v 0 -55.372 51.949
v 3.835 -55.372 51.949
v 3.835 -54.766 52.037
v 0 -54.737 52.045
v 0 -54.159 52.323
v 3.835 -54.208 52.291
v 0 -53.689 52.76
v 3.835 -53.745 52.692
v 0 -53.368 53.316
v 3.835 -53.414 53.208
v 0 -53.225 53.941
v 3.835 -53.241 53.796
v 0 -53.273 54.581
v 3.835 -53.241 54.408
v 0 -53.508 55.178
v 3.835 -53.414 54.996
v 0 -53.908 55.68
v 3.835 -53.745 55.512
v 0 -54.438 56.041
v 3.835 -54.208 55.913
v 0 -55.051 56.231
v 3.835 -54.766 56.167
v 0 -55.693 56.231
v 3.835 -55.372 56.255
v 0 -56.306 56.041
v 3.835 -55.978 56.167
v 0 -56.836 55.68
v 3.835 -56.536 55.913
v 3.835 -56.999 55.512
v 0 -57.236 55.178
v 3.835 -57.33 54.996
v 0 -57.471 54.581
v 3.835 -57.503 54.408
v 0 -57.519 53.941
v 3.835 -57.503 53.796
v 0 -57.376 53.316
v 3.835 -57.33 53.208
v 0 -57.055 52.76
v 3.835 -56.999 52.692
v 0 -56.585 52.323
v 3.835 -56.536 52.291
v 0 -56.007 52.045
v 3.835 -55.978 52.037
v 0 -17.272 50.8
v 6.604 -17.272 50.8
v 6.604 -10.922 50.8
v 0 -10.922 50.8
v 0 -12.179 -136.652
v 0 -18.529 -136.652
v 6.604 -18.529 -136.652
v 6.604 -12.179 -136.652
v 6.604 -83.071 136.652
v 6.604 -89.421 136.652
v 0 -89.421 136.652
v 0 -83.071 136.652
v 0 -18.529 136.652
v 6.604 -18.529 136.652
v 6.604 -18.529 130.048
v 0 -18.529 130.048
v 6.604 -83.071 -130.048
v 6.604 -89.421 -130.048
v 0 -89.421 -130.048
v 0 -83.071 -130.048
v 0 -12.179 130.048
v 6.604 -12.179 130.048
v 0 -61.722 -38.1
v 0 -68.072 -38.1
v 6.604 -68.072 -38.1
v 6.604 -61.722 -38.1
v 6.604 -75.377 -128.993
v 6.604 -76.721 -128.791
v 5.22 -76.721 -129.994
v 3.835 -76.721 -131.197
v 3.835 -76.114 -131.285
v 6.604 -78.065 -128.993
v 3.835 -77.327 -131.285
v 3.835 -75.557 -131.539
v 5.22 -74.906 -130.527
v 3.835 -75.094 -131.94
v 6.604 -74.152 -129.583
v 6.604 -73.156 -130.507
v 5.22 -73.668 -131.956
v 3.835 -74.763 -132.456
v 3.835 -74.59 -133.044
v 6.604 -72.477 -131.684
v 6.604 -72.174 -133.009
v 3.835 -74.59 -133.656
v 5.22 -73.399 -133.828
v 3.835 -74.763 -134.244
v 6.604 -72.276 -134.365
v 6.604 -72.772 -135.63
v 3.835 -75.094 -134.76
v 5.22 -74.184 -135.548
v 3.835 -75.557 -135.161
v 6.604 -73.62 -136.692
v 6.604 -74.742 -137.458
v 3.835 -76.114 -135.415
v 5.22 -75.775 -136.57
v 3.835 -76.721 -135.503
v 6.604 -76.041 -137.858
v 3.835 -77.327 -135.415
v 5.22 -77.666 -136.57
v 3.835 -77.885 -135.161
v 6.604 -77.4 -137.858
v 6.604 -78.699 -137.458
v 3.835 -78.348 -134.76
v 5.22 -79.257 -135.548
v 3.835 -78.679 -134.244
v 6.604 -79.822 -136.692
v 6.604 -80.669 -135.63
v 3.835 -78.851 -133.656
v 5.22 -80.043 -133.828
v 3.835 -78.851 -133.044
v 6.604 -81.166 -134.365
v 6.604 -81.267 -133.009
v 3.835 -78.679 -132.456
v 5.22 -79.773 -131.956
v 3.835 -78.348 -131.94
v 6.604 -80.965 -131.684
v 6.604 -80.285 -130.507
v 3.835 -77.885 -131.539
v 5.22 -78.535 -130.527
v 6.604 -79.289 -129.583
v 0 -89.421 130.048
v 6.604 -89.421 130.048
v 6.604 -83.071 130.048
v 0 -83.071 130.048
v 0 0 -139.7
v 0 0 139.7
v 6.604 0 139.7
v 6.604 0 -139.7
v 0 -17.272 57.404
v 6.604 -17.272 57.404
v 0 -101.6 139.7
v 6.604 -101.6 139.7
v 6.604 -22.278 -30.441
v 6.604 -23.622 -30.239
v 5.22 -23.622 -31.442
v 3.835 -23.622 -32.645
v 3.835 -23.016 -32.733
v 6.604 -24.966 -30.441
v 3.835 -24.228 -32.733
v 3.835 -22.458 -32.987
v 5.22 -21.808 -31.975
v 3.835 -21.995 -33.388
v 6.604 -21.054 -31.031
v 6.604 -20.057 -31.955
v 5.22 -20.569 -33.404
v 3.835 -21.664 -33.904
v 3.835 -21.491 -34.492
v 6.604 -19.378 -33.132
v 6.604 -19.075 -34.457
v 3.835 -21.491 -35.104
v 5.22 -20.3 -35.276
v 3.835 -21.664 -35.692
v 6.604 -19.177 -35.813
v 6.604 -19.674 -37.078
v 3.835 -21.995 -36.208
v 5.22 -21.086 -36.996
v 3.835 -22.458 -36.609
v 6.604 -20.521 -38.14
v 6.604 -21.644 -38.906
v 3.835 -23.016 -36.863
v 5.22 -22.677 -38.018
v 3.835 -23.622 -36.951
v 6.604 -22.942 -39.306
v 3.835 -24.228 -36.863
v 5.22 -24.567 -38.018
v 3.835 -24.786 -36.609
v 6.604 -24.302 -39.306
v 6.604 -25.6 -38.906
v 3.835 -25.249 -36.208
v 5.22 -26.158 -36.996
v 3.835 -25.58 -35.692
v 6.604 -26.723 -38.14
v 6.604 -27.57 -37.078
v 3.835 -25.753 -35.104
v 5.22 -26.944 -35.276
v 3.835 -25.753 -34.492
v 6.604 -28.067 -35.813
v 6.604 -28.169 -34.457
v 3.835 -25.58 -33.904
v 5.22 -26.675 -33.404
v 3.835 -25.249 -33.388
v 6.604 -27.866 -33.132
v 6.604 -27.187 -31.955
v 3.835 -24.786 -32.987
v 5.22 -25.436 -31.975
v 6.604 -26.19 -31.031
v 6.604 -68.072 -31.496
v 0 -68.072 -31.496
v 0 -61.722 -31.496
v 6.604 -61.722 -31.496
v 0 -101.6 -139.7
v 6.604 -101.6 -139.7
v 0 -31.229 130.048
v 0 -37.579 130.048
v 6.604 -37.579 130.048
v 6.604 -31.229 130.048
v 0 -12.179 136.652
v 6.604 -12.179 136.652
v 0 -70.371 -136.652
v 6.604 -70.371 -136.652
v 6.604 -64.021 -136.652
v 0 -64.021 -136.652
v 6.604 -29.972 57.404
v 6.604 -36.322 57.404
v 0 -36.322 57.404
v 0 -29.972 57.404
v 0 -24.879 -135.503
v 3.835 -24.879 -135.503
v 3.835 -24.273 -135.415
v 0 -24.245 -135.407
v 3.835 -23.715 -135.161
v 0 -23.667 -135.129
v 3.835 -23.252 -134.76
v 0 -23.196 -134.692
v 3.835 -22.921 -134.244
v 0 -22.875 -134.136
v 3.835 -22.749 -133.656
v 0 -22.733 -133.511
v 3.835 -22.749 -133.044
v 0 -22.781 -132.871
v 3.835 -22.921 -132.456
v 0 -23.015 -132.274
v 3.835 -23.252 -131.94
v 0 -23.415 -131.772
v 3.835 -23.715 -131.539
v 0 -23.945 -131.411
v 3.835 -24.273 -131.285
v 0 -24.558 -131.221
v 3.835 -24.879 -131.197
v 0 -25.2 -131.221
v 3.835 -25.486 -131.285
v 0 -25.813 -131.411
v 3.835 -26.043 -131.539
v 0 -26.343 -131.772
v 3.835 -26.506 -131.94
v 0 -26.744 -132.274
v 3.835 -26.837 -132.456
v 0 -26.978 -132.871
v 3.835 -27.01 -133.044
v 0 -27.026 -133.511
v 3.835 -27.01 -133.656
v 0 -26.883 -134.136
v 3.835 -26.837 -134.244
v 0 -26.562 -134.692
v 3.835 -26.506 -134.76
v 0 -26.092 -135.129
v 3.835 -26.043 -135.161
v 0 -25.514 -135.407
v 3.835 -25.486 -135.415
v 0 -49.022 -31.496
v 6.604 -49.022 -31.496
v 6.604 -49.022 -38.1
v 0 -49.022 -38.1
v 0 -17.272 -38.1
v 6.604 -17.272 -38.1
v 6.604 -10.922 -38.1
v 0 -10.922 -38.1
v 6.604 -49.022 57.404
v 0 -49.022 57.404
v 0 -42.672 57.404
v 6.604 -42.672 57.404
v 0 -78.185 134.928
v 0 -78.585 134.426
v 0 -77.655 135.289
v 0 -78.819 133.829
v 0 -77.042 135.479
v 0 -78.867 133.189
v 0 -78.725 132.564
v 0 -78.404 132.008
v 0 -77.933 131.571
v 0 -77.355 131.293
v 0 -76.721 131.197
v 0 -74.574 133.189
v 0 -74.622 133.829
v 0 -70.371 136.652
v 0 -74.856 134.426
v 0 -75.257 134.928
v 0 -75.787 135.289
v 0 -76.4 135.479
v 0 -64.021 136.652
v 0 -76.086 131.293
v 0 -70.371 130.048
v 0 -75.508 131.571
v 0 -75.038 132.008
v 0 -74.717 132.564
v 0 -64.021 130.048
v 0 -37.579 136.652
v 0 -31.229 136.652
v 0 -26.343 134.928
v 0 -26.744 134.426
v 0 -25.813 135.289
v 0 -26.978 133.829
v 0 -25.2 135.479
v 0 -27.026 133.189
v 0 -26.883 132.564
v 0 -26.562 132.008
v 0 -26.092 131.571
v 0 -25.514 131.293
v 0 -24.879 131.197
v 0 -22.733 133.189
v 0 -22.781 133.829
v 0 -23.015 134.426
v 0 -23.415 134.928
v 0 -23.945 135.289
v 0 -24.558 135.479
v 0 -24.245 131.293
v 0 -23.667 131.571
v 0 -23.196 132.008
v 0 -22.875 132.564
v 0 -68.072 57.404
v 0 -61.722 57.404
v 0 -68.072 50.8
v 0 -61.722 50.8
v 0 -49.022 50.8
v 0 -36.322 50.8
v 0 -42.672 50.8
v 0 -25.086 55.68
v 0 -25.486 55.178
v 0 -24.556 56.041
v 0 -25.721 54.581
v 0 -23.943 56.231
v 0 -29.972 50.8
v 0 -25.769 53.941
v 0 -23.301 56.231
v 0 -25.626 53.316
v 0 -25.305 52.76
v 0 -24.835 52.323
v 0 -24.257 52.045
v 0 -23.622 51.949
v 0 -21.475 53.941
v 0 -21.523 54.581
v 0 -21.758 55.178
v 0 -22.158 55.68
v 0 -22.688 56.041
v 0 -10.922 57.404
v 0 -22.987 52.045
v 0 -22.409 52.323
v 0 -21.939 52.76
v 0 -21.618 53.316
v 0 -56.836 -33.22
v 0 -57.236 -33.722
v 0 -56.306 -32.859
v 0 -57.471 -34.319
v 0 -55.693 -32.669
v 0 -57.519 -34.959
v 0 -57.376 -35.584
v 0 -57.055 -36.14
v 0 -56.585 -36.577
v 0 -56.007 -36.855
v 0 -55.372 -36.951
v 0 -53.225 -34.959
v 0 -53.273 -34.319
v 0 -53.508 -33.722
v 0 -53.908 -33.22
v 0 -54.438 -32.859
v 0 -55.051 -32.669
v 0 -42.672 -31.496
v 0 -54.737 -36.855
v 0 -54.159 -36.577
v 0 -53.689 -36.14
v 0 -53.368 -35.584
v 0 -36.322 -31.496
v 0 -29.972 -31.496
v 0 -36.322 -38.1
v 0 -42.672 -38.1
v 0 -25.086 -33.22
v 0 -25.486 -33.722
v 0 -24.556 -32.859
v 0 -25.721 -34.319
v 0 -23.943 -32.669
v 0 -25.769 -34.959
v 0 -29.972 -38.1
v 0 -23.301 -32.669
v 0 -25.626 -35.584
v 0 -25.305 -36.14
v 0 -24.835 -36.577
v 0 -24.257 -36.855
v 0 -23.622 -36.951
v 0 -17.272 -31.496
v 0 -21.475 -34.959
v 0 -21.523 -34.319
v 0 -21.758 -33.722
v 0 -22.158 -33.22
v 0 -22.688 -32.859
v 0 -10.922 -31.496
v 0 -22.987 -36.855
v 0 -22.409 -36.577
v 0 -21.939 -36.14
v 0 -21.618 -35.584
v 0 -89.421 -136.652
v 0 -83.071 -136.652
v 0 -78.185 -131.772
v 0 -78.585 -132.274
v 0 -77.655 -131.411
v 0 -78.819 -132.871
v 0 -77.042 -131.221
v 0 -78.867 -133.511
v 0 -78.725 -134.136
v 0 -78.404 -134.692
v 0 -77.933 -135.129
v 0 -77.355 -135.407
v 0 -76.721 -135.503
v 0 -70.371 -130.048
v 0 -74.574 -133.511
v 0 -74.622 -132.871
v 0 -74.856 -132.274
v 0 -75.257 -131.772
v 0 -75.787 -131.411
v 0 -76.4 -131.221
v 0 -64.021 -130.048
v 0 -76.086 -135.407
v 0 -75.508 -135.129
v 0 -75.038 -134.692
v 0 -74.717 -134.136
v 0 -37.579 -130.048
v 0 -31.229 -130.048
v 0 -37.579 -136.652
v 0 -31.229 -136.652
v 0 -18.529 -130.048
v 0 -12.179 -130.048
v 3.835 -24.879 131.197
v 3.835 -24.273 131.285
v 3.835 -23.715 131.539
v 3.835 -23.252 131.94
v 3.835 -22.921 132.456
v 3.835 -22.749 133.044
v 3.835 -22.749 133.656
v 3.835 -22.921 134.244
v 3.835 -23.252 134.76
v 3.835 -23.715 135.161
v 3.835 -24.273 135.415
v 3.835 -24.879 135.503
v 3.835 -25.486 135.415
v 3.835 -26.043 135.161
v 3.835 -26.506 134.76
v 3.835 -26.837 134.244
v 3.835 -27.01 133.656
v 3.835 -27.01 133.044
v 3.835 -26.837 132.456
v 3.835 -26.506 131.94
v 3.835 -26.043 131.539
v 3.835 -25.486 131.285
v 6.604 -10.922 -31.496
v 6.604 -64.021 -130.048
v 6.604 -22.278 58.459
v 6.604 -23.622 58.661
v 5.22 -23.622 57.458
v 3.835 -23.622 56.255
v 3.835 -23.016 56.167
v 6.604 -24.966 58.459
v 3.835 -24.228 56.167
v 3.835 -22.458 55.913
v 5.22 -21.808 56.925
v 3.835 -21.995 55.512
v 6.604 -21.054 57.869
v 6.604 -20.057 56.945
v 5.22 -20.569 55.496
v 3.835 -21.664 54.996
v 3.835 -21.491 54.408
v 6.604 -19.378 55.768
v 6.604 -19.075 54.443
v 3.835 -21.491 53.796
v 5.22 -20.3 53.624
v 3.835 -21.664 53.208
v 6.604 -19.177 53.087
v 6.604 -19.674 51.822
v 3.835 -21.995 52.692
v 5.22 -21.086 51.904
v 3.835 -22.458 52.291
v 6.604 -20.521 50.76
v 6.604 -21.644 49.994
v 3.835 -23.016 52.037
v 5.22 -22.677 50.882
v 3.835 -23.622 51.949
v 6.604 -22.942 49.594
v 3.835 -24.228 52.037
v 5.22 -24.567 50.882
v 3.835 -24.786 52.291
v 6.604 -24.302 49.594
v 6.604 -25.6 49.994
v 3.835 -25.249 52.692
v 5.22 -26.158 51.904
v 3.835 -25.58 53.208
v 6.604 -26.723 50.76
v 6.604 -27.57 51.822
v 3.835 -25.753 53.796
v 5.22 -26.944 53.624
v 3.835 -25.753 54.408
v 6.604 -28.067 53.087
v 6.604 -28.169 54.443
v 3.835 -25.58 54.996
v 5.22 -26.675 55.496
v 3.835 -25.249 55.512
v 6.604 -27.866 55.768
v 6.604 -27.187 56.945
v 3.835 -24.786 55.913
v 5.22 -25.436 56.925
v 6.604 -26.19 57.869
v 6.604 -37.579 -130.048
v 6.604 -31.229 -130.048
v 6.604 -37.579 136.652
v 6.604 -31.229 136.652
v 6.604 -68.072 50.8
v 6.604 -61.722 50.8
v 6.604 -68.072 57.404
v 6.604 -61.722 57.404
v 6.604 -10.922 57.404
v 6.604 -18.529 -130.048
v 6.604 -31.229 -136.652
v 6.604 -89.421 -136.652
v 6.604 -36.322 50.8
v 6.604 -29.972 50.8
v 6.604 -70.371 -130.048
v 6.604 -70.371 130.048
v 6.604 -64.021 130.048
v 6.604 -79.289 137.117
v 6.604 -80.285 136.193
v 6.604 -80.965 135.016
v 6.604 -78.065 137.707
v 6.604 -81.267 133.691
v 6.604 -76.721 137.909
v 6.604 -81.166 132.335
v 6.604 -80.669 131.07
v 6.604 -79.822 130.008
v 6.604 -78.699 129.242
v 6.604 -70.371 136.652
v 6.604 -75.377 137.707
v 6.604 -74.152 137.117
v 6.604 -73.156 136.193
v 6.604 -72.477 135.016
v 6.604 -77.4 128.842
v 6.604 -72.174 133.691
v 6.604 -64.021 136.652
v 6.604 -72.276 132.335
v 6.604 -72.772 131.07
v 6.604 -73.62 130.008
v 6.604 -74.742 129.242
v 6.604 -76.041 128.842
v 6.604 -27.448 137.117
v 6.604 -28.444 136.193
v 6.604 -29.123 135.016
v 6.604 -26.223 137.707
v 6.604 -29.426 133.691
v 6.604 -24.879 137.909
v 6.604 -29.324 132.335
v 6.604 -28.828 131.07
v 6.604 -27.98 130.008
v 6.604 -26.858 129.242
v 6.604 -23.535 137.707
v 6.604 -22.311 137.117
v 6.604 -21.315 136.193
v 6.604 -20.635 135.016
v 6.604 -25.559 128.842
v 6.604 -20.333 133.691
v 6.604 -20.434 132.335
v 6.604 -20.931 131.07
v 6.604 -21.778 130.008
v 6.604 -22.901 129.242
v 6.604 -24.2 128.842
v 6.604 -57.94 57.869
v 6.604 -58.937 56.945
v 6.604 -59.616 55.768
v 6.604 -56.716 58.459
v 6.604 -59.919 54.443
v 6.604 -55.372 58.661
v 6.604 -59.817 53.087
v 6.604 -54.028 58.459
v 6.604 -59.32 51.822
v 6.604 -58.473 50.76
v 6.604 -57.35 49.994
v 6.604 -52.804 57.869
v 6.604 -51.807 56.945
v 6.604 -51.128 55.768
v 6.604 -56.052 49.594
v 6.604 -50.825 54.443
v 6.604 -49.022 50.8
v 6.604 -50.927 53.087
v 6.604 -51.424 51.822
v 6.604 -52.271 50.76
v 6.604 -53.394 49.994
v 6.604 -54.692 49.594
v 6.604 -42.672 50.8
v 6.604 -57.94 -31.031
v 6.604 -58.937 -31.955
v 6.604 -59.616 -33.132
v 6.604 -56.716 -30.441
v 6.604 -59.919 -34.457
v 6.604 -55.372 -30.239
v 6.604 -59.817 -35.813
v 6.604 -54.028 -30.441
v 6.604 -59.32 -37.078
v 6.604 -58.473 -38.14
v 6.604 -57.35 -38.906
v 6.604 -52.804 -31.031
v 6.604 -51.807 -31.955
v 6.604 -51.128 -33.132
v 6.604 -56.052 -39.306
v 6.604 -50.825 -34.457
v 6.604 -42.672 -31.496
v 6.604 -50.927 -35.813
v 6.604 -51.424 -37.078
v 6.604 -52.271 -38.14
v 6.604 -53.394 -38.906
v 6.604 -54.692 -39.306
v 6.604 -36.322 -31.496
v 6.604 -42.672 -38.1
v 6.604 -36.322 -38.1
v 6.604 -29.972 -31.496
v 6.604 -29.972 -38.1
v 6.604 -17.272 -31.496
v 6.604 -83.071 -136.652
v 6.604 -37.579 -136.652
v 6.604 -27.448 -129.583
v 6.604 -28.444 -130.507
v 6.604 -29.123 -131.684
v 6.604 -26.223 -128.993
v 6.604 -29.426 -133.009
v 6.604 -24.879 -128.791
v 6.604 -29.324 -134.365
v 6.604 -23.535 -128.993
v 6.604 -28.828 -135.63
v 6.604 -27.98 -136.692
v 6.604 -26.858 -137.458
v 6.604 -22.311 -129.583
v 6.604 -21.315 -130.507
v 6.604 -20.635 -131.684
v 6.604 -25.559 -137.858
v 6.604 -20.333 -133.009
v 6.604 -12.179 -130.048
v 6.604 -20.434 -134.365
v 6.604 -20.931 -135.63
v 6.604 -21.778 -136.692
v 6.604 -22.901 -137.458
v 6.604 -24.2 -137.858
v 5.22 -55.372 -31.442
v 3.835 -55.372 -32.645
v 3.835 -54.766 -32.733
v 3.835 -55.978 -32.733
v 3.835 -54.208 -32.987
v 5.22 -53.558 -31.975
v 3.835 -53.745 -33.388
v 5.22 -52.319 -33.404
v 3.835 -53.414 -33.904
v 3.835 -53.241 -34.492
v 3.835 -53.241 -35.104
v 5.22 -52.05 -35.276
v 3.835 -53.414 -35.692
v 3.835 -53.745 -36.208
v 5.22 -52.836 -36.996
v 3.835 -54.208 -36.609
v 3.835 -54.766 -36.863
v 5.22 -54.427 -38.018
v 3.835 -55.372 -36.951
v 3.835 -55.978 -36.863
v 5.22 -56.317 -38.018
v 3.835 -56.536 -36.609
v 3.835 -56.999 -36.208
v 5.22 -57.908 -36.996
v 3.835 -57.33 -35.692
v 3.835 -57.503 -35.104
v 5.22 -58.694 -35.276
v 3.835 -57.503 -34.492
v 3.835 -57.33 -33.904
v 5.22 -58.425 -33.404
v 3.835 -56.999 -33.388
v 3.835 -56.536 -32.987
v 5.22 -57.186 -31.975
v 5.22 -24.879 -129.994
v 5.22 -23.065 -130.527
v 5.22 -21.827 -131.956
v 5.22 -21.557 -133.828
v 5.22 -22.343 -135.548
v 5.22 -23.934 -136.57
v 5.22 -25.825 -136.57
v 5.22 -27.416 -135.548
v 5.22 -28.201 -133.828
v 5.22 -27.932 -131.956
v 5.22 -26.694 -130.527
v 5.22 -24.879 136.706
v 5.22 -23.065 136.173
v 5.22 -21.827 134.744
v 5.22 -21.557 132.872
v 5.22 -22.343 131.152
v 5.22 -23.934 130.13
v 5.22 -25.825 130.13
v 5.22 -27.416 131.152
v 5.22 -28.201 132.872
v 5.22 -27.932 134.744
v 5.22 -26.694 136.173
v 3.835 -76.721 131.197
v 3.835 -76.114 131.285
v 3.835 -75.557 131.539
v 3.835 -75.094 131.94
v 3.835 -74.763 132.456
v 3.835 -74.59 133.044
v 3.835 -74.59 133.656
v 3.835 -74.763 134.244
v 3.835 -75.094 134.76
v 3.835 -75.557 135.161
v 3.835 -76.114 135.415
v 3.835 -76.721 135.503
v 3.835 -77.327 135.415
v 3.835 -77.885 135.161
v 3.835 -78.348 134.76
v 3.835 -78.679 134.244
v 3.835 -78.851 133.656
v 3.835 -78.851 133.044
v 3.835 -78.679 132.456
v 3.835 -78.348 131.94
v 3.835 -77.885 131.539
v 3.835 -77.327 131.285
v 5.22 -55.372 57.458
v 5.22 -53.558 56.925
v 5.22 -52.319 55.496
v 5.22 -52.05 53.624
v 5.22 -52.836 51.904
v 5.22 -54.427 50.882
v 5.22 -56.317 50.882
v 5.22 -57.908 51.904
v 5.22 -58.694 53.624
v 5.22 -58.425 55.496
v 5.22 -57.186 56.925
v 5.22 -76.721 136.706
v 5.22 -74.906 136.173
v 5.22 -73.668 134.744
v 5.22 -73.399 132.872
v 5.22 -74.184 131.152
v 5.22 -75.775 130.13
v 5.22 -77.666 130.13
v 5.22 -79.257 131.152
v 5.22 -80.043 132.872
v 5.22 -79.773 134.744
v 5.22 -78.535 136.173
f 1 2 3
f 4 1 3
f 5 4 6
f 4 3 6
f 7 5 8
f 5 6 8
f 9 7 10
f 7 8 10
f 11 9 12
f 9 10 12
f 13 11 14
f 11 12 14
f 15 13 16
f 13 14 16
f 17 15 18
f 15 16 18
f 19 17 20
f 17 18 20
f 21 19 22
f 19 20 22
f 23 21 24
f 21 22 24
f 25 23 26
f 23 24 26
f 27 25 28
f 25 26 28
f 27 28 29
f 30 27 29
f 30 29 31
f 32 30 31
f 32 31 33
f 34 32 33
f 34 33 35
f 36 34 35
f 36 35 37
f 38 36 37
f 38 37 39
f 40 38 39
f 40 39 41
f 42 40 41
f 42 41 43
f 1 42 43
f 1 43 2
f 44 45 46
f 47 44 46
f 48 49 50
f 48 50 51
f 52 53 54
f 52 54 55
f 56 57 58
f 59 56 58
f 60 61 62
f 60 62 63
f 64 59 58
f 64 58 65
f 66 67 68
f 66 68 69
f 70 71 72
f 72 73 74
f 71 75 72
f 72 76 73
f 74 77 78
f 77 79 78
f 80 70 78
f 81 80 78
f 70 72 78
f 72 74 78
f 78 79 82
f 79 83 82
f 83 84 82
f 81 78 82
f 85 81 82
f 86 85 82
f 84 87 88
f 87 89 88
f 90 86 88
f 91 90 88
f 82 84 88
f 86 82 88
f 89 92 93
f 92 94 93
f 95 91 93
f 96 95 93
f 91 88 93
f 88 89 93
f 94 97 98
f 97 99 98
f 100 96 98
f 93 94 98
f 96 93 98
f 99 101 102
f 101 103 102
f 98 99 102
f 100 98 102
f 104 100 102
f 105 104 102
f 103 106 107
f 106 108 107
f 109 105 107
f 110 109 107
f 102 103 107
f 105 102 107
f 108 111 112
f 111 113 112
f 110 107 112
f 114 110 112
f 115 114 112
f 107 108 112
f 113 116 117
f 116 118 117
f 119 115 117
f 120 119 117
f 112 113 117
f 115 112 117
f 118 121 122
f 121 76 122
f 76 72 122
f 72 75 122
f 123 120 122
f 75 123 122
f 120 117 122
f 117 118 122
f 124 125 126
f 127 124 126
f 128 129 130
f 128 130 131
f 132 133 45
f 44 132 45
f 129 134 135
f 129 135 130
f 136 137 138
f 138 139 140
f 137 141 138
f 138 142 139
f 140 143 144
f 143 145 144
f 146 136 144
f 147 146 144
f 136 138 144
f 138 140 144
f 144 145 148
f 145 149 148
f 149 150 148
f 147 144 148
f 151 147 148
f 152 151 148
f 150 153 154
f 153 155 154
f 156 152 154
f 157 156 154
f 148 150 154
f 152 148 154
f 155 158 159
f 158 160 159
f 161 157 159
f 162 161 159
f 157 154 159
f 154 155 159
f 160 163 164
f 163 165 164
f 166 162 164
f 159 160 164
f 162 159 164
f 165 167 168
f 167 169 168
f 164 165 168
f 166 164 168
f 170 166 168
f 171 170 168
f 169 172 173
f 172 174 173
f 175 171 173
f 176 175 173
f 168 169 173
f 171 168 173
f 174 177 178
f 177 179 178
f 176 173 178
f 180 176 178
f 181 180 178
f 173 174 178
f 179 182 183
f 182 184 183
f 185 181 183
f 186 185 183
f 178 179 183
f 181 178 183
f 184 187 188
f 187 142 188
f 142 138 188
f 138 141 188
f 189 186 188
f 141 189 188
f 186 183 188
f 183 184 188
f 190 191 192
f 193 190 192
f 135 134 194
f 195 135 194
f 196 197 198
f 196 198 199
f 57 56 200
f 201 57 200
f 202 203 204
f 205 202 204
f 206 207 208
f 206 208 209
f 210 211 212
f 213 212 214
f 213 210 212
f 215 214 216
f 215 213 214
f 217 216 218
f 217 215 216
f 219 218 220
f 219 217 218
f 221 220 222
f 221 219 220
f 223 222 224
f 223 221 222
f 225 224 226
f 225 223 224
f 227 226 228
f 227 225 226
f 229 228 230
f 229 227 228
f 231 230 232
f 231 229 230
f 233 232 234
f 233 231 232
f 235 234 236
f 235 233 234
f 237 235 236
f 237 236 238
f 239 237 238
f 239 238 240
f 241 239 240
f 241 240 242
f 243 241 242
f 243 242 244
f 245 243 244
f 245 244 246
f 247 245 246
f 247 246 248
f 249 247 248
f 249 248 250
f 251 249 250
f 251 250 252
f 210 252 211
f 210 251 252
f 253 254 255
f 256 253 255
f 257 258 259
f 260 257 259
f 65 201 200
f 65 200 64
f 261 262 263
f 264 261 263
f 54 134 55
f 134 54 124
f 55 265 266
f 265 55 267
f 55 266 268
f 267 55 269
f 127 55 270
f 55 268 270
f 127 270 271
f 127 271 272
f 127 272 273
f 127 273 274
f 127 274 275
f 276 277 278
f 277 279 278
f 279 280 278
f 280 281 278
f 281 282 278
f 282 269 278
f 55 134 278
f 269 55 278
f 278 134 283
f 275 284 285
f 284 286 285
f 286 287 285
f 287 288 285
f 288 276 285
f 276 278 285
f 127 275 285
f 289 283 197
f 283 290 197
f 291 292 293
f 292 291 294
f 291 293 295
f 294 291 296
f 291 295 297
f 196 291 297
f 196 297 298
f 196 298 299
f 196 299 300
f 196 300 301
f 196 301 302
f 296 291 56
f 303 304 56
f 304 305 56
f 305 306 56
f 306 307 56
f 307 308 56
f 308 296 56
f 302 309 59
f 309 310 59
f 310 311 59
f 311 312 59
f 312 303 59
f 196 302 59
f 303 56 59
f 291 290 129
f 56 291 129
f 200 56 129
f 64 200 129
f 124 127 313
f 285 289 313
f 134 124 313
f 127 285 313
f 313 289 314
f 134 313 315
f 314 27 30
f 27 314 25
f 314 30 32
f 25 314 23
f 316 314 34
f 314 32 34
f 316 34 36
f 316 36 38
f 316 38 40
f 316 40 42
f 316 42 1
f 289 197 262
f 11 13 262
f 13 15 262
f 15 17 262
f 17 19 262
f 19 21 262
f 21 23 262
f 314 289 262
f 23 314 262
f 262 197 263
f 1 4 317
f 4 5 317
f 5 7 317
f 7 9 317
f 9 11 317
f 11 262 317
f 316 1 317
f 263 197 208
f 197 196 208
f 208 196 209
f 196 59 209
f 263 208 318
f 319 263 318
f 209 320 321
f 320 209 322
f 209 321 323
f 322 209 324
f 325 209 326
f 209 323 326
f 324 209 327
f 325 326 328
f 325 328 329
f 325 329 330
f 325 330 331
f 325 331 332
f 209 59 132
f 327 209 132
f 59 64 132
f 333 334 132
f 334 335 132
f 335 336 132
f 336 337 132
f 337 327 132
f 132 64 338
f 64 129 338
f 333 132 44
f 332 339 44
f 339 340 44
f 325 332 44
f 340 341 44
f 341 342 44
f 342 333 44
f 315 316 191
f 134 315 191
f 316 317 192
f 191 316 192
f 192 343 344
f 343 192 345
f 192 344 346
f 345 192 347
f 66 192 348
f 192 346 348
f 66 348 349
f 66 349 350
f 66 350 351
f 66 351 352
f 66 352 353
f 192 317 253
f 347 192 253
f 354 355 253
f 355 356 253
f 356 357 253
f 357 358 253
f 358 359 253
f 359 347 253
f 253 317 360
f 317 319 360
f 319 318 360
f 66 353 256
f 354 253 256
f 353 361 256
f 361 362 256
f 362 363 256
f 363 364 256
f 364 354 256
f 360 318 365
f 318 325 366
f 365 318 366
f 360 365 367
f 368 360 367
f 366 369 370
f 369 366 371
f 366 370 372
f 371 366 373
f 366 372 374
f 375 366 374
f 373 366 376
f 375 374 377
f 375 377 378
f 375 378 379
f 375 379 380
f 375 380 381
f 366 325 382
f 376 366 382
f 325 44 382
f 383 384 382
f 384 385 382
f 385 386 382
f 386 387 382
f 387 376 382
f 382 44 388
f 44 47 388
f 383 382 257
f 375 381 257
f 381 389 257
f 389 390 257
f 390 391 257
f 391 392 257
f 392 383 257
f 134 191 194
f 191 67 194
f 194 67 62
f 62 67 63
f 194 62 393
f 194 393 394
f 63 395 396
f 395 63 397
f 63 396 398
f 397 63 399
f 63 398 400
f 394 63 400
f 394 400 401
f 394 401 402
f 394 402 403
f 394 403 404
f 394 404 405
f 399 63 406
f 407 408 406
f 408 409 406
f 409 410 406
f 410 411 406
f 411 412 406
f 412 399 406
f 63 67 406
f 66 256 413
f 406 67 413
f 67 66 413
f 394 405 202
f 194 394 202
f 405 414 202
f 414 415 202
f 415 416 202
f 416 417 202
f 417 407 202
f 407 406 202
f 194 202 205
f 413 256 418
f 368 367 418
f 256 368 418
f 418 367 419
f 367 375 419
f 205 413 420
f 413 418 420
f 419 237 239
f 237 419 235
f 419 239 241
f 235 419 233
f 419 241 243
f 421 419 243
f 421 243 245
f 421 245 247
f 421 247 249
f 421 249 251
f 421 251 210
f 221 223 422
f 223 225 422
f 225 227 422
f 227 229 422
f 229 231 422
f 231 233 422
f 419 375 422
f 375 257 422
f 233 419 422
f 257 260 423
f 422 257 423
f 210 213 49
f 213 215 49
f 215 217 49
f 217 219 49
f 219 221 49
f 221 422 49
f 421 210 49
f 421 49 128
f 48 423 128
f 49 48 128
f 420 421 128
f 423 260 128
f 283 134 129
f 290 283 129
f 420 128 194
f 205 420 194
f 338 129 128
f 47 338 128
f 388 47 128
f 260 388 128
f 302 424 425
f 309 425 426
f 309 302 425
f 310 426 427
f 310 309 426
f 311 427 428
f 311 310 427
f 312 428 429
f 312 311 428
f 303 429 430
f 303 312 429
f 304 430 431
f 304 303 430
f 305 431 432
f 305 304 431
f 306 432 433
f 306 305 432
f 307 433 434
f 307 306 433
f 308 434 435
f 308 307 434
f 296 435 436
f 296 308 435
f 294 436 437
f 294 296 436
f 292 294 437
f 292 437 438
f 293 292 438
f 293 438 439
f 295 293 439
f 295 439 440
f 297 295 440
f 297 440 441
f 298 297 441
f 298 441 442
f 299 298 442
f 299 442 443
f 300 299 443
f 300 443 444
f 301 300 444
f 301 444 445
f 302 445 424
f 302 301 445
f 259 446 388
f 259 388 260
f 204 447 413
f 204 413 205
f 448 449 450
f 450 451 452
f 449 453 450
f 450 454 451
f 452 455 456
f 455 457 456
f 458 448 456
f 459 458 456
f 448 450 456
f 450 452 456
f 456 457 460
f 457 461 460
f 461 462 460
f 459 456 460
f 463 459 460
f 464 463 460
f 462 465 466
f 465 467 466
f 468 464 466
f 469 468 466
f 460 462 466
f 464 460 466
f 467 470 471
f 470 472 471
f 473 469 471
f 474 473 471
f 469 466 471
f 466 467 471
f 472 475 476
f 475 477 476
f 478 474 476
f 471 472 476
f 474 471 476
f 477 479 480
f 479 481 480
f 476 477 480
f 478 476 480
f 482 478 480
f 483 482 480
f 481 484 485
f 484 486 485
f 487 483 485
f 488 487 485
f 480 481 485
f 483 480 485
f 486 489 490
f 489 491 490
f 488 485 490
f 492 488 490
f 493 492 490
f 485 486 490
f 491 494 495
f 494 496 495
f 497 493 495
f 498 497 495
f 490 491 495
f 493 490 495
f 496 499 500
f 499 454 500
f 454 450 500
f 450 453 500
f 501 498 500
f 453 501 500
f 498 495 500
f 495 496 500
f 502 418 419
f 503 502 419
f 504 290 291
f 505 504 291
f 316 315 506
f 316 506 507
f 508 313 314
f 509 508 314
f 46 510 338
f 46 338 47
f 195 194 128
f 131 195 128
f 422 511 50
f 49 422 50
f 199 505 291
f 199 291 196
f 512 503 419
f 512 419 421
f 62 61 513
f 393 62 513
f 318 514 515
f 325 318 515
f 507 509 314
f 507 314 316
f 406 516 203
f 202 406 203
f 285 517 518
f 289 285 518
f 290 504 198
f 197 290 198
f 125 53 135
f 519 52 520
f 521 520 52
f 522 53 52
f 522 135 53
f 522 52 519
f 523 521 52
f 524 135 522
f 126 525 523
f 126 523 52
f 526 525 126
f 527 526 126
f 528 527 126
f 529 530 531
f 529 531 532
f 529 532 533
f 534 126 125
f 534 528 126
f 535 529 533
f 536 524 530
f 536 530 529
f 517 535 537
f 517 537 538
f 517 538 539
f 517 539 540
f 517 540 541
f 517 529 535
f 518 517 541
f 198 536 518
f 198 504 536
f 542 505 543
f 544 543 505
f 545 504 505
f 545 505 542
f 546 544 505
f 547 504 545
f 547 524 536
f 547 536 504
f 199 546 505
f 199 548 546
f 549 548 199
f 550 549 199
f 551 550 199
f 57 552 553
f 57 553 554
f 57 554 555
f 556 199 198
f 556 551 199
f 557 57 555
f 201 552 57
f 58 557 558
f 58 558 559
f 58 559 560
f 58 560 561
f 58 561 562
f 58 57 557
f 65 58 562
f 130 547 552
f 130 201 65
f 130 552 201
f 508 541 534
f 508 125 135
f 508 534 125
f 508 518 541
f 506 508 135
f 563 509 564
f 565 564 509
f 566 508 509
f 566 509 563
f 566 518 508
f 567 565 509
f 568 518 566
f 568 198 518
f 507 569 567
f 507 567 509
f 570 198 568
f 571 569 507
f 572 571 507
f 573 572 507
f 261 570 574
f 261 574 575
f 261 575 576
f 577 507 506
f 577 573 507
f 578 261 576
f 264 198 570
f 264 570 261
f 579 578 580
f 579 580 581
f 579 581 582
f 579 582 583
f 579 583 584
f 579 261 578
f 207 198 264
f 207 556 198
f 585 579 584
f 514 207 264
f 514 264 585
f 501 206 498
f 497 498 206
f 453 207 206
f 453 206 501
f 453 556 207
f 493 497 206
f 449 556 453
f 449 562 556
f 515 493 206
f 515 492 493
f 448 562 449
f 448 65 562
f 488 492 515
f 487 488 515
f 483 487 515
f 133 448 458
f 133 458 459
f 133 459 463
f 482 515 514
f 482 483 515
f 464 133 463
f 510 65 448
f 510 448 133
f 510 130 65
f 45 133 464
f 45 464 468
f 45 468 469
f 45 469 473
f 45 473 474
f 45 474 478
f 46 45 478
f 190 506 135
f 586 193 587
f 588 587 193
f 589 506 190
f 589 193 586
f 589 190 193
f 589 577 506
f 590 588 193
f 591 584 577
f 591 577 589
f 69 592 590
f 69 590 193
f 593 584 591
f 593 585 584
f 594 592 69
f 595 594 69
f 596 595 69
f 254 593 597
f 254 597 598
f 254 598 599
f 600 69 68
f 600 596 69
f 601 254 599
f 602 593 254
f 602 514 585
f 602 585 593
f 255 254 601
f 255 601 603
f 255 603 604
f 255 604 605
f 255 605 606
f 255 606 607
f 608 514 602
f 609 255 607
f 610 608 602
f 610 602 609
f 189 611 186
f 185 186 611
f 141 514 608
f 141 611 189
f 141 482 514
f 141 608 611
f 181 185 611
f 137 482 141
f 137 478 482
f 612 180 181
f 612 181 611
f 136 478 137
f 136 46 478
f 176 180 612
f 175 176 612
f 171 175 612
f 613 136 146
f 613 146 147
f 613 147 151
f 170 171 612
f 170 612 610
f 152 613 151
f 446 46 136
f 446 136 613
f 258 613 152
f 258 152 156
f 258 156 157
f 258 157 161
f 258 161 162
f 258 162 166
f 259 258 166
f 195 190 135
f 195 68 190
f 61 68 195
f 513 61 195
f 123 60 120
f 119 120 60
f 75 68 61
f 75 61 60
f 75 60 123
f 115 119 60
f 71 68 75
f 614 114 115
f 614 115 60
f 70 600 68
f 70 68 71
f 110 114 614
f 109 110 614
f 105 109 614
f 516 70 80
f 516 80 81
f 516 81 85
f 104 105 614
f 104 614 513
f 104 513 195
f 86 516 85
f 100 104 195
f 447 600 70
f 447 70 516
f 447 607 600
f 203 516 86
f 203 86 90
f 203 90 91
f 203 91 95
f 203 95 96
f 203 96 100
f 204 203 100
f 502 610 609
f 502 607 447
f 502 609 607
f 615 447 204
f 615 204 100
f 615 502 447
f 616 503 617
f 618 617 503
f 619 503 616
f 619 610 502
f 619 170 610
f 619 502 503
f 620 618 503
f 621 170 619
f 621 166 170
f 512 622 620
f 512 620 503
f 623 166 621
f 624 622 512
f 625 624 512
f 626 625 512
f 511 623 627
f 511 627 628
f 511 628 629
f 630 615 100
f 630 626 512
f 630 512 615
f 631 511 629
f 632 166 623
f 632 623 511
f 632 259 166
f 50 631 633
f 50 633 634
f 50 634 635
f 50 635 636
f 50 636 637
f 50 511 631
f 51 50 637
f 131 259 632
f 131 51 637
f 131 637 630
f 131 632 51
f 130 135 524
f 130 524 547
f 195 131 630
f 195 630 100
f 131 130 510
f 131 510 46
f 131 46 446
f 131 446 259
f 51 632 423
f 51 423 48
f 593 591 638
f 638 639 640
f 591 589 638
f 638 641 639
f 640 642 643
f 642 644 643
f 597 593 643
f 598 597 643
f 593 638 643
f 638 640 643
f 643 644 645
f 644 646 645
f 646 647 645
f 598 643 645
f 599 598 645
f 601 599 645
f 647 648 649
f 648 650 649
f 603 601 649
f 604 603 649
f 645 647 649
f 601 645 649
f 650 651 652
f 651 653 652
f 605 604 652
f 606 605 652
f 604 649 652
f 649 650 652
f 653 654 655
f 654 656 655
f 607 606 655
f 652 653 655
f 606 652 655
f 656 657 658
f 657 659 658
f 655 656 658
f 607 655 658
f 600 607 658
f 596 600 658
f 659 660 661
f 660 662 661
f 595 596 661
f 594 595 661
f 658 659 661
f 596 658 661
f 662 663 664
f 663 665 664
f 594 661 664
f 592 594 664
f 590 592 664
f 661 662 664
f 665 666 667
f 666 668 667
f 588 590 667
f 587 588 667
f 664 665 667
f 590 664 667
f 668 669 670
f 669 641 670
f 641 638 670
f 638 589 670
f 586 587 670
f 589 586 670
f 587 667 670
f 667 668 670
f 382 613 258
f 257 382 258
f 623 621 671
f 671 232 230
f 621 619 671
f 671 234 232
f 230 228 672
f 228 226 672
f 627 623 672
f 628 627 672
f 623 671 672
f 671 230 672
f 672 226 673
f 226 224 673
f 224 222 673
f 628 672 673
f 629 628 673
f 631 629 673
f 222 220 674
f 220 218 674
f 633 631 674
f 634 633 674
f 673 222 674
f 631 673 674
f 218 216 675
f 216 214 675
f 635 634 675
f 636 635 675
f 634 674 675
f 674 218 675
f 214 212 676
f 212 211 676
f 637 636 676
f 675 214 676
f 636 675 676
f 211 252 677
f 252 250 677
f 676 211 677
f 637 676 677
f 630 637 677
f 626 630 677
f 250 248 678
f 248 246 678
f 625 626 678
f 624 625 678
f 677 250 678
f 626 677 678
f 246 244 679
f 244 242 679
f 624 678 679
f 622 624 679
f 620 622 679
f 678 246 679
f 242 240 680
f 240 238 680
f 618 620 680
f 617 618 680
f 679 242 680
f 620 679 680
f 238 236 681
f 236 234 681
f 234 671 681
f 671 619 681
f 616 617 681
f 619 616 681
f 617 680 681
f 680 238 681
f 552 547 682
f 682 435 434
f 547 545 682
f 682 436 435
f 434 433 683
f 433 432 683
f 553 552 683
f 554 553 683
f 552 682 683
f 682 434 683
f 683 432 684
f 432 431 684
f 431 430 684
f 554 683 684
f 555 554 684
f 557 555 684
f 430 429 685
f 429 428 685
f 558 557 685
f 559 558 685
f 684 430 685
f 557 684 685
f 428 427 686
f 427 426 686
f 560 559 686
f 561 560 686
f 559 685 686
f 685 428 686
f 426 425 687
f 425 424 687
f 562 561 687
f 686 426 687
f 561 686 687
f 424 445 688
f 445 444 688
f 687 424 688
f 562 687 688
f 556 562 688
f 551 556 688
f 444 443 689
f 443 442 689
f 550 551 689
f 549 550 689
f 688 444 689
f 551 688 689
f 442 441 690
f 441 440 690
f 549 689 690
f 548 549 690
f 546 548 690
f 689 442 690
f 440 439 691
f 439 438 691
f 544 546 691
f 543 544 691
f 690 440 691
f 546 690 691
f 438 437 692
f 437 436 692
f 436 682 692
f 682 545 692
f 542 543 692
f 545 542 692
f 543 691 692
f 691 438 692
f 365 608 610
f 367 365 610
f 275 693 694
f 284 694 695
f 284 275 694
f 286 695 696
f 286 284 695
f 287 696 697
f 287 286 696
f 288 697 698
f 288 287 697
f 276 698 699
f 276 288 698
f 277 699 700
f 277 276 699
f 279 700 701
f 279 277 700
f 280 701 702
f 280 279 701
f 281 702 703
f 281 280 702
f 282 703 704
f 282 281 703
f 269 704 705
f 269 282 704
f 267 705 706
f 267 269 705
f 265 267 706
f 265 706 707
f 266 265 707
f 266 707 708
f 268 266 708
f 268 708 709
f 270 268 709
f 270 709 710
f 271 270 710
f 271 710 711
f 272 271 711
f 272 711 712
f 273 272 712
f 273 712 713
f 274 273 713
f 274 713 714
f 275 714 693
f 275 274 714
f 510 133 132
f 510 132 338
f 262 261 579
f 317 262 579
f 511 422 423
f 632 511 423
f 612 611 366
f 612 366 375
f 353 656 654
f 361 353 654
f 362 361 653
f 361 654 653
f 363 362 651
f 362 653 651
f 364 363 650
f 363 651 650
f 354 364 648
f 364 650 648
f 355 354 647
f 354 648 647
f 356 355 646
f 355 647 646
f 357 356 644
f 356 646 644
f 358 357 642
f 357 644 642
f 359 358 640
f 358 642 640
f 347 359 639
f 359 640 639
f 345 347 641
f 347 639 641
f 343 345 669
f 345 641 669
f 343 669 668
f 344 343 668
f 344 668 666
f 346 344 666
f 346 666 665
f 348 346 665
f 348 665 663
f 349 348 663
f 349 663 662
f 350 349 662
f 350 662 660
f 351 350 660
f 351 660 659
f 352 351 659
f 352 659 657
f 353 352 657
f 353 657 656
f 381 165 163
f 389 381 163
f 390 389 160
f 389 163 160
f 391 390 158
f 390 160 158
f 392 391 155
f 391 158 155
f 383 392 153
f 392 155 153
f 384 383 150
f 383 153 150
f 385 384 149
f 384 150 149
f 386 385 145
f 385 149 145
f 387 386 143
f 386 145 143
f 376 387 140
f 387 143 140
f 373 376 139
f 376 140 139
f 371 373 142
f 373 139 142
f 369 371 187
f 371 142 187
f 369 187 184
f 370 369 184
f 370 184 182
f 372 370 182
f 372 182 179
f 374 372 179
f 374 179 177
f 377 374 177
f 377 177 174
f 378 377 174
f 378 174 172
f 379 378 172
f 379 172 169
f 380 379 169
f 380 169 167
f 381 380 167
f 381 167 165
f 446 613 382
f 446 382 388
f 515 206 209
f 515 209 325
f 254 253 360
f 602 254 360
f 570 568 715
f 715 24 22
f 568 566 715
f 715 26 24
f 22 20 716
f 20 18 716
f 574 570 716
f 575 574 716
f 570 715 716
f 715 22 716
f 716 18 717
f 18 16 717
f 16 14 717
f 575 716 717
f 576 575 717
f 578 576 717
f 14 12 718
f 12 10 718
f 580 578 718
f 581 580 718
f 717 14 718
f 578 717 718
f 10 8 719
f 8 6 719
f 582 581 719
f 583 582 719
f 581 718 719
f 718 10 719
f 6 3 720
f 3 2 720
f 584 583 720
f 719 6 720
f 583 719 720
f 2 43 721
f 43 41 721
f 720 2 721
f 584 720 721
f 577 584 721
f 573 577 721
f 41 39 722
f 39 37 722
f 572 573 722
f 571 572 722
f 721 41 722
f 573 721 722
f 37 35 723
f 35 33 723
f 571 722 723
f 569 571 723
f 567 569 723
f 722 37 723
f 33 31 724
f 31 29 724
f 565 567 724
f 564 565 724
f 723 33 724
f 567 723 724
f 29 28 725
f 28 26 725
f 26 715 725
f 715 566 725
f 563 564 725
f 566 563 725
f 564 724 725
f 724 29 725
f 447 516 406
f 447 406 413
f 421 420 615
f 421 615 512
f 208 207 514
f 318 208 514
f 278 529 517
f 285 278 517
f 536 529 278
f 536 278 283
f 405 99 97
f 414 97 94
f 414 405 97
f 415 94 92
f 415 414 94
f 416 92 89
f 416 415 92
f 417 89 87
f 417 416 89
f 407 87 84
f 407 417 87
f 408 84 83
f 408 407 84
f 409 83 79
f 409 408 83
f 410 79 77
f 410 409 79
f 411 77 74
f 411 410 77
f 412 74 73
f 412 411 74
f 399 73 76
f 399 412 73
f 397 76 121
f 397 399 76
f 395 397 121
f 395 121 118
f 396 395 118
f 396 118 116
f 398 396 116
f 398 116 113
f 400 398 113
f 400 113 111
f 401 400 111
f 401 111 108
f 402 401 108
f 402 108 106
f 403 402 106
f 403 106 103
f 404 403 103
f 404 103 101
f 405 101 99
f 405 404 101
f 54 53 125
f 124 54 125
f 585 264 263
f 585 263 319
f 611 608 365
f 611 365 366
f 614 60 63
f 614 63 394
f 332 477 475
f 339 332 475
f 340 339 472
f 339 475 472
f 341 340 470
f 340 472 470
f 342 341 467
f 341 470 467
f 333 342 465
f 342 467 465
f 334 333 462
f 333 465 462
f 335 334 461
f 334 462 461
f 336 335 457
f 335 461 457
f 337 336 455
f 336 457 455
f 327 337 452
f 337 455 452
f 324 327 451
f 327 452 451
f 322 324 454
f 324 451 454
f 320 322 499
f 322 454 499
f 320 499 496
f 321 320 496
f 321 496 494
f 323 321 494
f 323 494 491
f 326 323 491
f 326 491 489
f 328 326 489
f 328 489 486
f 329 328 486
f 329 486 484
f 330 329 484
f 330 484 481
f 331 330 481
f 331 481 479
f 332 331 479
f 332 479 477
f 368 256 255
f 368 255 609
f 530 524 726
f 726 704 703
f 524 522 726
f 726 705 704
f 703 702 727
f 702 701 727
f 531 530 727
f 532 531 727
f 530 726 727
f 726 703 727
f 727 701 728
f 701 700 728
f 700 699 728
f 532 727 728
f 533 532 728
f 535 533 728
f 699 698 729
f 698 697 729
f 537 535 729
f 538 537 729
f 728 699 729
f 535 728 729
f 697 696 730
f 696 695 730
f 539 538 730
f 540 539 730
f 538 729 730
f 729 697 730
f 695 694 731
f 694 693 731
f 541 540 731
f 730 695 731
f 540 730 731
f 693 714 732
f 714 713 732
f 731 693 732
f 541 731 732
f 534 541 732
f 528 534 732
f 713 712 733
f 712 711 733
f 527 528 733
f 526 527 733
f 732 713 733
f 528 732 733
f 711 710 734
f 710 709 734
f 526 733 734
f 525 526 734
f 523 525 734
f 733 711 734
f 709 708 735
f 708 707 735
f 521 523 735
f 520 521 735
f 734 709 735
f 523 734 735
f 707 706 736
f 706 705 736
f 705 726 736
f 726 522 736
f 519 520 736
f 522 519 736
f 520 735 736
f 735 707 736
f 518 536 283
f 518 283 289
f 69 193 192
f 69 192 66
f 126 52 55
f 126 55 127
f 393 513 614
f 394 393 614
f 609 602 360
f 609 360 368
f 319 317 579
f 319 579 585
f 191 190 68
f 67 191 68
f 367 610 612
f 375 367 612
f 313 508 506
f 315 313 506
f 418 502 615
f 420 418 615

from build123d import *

# Parameters (mm, degrees)
SKETCH1_W                                         = 279.4
SKETCH1_H                                         = 101.6
SKETCH1_R                                         = 2.15265
SKETCH1_W_2                                       = 6.604
SKETCH1_H_2                                       = 6.35
BOSS_EXTRUDE1_DEPTH                               = 6.604
SKETCH2_R                                         = 2.15265
SKETCH2_W                                         = 6.604
SKETCH2_H                                         = 6.35
CUT_EXTRUDE1_DEPTH                                = 7.604
CSK_FOR_8_FLAT_HEAD_SOCKET_CAP_SCREW1_D           = 4.3053
CSK_FOR_8_FLAT_HEAD_SOCKET_CAP_SCREW1_CSINK_D     = 9.1186
CSK_FOR_8_FLAT_HEAD_SOCKET_CAP_SCREW1_CSINK_ANGLE = 82


with BuildPart() as part:
    # Sketch1 → Boss-Extrude1 (new body)
    with BuildSketch(Plane(origin=(0, 0, 0), x_dir=(0, 0, -1), z_dir=(1, 0, 0))):
        with Locations((0, -50.8)):
            Rectangle(SKETCH1_W, SKETCH1_H)
        with Locations((-133.35, -24.8793)):
            Circle(SKETCH1_R, mode=Mode.SUBTRACT)
        with Locations((-133.35, -76.7207)):
            Circle(SKETCH1_R, mode=Mode.SUBTRACT)
        with Locations((133.35, -24.8793)):
            Circle(SKETCH1_R, mode=Mode.SUBTRACT)
        with Locations((133.35, -76.720700102)):
            Circle(SKETCH1_R, mode=Mode.SUBTRACT)
        with Locations((-133.35, -34.4043)):
            Rectangle(SKETCH1_W_2, SKETCH1_H_2, mode=Mode.SUBTRACT)
        with Locations((-133.35, -15.3543)):
            Rectangle(SKETCH1_W_2, SKETCH1_H_2, mode=Mode.SUBTRACT)
        with Locations((-133.35, -86.2457)):
            Rectangle(SKETCH1_W_2, SKETCH1_H_2, mode=Mode.SUBTRACT)
        with Locations((-133.35, -67.1957)):
            Rectangle(SKETCH1_W_2, SKETCH1_H_2, mode=Mode.SUBTRACT)
        with Locations((133.35, -15.3543)):
            Rectangle(SKETCH1_W_2, SKETCH1_H_2, mode=Mode.SUBTRACT)
        with Locations((133.35, -34.4043)):
            Rectangle(SKETCH1_W_2, SKETCH1_H_2, mode=Mode.SUBTRACT)
        with Locations((133.35, -67.195700102)):
            Rectangle(SKETCH1_W_2, SKETCH1_H_2, mode=Mode.SUBTRACT)
        with Locations((133.35, -86.245700102)):
            Rectangle(SKETCH1_W_2, SKETCH1_H_2, mode=Mode.SUBTRACT)
    extrude(amount=BOSS_EXTRUDE1_DEPTH)

    # Sketch2 → Cut-Extrude1 (cut, through all)
    with BuildSketch(Plane(origin=(6.604, 0, 0), x_dir=(0, 0, -1), z_dir=(1, 0, 0))):
        with Locations((-54.102, -23.622)):
            Circle(SKETCH2_R)
        with Locations((34.798, -55.372)):
            Circle(SKETCH2_R)
        with Locations((-54.102, -55.372)):
            Circle(SKETCH2_R)
        with Locations((34.798, -23.622)):
            Circle(SKETCH2_R)
        with Locations((-54.102, -14.097)):
            Rectangle(SKETCH2_W, SKETCH2_H)
        with Locations((-54.102, -33.147)):
            Rectangle(SKETCH2_W, SKETCH2_H)
        with Locations((34.798, -45.847)):
            Rectangle(SKETCH2_W, SKETCH2_H)
        with Locations((34.798, -64.897)):
            Rectangle(SKETCH2_W, SKETCH2_H)
        with Locations((-54.102, -45.847)):
            Rectangle(SKETCH2_W, SKETCH2_H)
        with Locations((-54.102, -64.897)):
            Rectangle(SKETCH2_W, SKETCH2_H)
        with Locations((34.798, -14.097)):
            Rectangle(SKETCH2_W, SKETCH2_H)
        with Locations((34.798, -33.147)):
            Rectangle(SKETCH2_W, SKETCH2_H)
    extrude(amount=-CUT_EXTRUDE1_DEPTH, mode=Mode.SUBTRACT)

    # CSK for #8 Flat Head Socket Cap Screw1 (through all)
    with Locations(Plane(origin=(6.604, 0, 0), x_dir=(0, 0, -1), z_dir=(1, 0, 0))):
        with Locations((-133.35, -24.8793), (-133.35, -76.7207), (-54.102, -55.372), (-54.102, -23.622), (34.798, -23.622), (34.798, -55.372), (133.35, -76.720700102), (133.35, -24.8793)):
            CounterSinkHole(CSK_FOR_8_FLAT_HEAD_SOCKET_CAP_SCREW1_D / 2, CSK_FOR_8_FLAT_HEAD_SOCKET_CAP_SCREW1_CSINK_D / 2, counter_sink_angle=CSK_FOR_8_FLAT_HEAD_SOCKET_CAP_SCREW1_CSINK_ANGLE)


solid = part.part
